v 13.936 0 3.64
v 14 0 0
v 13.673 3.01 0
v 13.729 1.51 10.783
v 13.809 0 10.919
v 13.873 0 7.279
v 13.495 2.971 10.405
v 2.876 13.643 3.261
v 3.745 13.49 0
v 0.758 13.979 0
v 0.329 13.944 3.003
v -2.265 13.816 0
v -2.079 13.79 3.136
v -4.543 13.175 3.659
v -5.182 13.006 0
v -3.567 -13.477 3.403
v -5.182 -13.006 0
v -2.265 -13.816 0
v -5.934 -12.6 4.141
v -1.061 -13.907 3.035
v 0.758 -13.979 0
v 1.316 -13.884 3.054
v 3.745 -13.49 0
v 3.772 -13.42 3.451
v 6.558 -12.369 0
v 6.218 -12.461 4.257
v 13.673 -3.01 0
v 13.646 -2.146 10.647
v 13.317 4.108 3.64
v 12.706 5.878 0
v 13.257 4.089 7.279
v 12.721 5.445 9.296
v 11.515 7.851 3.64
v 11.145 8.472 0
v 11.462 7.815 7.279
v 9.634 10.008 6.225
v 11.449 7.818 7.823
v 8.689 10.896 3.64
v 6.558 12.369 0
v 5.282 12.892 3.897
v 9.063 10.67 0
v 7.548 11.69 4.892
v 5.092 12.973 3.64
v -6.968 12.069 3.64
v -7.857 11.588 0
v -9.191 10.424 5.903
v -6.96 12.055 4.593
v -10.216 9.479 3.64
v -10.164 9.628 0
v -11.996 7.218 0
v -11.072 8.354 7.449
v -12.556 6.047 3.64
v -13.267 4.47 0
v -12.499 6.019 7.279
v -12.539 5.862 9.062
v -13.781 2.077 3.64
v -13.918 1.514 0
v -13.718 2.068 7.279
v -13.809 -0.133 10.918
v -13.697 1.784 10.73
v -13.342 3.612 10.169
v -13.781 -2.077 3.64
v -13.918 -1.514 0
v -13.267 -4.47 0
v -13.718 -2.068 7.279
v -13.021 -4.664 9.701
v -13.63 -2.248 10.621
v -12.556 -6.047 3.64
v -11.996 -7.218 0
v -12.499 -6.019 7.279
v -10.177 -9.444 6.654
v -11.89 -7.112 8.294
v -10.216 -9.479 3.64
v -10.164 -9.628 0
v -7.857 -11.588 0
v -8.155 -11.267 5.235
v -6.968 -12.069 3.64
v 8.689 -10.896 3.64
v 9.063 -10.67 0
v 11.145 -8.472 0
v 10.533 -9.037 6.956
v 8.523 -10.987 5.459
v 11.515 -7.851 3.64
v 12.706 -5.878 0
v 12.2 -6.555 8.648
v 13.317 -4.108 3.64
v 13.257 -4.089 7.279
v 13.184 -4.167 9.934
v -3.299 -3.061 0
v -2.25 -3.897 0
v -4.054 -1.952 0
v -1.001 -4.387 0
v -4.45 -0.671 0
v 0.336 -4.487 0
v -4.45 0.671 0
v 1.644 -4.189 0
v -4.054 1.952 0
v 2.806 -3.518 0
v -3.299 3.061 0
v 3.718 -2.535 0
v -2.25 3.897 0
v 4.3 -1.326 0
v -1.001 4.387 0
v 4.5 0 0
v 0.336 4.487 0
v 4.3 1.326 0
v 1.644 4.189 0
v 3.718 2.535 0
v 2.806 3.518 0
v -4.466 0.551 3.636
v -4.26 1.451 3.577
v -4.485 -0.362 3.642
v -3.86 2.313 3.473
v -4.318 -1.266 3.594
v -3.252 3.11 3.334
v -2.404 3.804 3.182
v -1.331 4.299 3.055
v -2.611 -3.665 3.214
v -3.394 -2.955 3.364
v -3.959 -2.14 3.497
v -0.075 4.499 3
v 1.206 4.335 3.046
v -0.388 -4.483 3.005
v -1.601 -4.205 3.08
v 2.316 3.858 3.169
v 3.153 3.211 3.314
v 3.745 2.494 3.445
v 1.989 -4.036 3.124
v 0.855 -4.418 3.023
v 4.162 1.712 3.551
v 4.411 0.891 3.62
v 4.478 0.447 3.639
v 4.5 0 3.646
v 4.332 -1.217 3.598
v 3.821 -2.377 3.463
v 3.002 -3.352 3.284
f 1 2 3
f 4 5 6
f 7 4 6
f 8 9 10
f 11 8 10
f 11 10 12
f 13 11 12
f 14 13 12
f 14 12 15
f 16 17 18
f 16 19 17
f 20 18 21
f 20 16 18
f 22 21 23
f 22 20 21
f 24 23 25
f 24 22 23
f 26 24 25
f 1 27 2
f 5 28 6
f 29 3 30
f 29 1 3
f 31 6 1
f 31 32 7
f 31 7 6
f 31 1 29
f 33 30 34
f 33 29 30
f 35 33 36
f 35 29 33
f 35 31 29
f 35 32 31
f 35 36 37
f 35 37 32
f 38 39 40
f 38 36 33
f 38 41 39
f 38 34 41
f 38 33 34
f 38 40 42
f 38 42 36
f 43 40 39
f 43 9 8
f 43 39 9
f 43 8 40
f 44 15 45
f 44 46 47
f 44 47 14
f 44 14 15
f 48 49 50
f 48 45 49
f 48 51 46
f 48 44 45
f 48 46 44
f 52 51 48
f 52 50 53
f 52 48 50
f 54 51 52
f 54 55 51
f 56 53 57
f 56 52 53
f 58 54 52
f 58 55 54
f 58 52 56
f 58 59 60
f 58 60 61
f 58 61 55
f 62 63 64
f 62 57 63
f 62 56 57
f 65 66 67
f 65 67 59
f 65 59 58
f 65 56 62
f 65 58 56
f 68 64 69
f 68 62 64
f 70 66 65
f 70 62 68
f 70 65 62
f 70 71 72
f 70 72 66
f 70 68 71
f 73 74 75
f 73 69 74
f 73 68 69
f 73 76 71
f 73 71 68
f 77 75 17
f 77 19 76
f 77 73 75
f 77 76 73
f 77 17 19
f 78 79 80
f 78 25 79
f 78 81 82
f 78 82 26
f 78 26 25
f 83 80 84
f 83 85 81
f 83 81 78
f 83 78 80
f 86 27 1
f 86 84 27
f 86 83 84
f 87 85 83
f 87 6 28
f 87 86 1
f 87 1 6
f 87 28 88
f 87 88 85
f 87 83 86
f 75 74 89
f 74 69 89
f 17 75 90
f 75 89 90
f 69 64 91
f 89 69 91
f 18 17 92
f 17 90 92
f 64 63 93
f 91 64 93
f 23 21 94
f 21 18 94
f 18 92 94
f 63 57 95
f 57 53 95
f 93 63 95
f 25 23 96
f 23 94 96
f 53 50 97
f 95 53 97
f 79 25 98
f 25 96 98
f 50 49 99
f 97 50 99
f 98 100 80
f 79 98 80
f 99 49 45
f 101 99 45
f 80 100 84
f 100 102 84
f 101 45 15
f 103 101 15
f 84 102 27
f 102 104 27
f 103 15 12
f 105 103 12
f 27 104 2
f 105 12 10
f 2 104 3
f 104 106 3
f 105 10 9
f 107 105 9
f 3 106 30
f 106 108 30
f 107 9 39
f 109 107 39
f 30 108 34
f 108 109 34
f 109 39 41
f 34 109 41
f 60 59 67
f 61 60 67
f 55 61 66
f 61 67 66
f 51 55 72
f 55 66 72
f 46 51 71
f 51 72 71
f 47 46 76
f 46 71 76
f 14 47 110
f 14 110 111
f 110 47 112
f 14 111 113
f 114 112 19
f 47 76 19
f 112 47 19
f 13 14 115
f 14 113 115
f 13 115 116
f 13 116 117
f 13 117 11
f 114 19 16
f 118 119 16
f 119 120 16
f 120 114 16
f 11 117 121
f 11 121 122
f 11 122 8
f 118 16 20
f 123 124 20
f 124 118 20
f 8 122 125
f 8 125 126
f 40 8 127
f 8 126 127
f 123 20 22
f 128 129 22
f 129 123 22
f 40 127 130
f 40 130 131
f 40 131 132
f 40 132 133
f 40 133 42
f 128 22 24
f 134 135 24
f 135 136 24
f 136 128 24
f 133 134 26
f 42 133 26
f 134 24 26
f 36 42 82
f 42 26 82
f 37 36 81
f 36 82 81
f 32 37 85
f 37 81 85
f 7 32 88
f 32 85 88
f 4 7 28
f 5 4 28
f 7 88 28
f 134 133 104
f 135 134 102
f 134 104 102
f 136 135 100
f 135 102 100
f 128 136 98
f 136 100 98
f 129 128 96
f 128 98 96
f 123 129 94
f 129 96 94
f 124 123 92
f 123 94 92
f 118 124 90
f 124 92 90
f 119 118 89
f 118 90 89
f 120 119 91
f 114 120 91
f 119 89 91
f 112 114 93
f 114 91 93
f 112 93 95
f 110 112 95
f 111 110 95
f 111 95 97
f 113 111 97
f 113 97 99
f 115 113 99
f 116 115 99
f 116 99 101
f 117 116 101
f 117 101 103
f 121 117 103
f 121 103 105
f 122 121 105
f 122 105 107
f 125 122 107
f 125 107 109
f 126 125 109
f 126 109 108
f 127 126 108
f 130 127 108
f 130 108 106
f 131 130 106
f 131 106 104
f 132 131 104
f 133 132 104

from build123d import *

# Parameters (mm, degrees)
F0_R     = 14
F1_DEPTH = 12
F1_TAPER = 1
F2_R     = 16
F3_DEPTH = 16
F4_R     = 4.5
F5_DEPTH = 5


with BuildPart() as f1:
    # F0 (on Top) → F1 (new body)
    with BuildSketch(Plane.XY):
        Circle(F0_R)
    extrude(amount=F1_DEPTH, taper=F1_TAPER)

    # F2 (on Front) → F3 (cut, symmetric)
    with BuildSketch(Plane.XZ):
        with Locations((0, 19)):
            Circle(F2_R)
    extrude(amount=F3_DEPTH, both=True, mode=Mode.SUBTRACT)

    # F4 (on face) → F5 (cut)
    with BuildSketch(Plane(origin=(0, 0, 0), x_dir=(1, 0, 0), z_dir=(0, 0, -1))):
        Circle(F4_R)
    extrude(amount=-F5_DEPTH, mode=Mode.SUBTRACT)


solid = f1.part
